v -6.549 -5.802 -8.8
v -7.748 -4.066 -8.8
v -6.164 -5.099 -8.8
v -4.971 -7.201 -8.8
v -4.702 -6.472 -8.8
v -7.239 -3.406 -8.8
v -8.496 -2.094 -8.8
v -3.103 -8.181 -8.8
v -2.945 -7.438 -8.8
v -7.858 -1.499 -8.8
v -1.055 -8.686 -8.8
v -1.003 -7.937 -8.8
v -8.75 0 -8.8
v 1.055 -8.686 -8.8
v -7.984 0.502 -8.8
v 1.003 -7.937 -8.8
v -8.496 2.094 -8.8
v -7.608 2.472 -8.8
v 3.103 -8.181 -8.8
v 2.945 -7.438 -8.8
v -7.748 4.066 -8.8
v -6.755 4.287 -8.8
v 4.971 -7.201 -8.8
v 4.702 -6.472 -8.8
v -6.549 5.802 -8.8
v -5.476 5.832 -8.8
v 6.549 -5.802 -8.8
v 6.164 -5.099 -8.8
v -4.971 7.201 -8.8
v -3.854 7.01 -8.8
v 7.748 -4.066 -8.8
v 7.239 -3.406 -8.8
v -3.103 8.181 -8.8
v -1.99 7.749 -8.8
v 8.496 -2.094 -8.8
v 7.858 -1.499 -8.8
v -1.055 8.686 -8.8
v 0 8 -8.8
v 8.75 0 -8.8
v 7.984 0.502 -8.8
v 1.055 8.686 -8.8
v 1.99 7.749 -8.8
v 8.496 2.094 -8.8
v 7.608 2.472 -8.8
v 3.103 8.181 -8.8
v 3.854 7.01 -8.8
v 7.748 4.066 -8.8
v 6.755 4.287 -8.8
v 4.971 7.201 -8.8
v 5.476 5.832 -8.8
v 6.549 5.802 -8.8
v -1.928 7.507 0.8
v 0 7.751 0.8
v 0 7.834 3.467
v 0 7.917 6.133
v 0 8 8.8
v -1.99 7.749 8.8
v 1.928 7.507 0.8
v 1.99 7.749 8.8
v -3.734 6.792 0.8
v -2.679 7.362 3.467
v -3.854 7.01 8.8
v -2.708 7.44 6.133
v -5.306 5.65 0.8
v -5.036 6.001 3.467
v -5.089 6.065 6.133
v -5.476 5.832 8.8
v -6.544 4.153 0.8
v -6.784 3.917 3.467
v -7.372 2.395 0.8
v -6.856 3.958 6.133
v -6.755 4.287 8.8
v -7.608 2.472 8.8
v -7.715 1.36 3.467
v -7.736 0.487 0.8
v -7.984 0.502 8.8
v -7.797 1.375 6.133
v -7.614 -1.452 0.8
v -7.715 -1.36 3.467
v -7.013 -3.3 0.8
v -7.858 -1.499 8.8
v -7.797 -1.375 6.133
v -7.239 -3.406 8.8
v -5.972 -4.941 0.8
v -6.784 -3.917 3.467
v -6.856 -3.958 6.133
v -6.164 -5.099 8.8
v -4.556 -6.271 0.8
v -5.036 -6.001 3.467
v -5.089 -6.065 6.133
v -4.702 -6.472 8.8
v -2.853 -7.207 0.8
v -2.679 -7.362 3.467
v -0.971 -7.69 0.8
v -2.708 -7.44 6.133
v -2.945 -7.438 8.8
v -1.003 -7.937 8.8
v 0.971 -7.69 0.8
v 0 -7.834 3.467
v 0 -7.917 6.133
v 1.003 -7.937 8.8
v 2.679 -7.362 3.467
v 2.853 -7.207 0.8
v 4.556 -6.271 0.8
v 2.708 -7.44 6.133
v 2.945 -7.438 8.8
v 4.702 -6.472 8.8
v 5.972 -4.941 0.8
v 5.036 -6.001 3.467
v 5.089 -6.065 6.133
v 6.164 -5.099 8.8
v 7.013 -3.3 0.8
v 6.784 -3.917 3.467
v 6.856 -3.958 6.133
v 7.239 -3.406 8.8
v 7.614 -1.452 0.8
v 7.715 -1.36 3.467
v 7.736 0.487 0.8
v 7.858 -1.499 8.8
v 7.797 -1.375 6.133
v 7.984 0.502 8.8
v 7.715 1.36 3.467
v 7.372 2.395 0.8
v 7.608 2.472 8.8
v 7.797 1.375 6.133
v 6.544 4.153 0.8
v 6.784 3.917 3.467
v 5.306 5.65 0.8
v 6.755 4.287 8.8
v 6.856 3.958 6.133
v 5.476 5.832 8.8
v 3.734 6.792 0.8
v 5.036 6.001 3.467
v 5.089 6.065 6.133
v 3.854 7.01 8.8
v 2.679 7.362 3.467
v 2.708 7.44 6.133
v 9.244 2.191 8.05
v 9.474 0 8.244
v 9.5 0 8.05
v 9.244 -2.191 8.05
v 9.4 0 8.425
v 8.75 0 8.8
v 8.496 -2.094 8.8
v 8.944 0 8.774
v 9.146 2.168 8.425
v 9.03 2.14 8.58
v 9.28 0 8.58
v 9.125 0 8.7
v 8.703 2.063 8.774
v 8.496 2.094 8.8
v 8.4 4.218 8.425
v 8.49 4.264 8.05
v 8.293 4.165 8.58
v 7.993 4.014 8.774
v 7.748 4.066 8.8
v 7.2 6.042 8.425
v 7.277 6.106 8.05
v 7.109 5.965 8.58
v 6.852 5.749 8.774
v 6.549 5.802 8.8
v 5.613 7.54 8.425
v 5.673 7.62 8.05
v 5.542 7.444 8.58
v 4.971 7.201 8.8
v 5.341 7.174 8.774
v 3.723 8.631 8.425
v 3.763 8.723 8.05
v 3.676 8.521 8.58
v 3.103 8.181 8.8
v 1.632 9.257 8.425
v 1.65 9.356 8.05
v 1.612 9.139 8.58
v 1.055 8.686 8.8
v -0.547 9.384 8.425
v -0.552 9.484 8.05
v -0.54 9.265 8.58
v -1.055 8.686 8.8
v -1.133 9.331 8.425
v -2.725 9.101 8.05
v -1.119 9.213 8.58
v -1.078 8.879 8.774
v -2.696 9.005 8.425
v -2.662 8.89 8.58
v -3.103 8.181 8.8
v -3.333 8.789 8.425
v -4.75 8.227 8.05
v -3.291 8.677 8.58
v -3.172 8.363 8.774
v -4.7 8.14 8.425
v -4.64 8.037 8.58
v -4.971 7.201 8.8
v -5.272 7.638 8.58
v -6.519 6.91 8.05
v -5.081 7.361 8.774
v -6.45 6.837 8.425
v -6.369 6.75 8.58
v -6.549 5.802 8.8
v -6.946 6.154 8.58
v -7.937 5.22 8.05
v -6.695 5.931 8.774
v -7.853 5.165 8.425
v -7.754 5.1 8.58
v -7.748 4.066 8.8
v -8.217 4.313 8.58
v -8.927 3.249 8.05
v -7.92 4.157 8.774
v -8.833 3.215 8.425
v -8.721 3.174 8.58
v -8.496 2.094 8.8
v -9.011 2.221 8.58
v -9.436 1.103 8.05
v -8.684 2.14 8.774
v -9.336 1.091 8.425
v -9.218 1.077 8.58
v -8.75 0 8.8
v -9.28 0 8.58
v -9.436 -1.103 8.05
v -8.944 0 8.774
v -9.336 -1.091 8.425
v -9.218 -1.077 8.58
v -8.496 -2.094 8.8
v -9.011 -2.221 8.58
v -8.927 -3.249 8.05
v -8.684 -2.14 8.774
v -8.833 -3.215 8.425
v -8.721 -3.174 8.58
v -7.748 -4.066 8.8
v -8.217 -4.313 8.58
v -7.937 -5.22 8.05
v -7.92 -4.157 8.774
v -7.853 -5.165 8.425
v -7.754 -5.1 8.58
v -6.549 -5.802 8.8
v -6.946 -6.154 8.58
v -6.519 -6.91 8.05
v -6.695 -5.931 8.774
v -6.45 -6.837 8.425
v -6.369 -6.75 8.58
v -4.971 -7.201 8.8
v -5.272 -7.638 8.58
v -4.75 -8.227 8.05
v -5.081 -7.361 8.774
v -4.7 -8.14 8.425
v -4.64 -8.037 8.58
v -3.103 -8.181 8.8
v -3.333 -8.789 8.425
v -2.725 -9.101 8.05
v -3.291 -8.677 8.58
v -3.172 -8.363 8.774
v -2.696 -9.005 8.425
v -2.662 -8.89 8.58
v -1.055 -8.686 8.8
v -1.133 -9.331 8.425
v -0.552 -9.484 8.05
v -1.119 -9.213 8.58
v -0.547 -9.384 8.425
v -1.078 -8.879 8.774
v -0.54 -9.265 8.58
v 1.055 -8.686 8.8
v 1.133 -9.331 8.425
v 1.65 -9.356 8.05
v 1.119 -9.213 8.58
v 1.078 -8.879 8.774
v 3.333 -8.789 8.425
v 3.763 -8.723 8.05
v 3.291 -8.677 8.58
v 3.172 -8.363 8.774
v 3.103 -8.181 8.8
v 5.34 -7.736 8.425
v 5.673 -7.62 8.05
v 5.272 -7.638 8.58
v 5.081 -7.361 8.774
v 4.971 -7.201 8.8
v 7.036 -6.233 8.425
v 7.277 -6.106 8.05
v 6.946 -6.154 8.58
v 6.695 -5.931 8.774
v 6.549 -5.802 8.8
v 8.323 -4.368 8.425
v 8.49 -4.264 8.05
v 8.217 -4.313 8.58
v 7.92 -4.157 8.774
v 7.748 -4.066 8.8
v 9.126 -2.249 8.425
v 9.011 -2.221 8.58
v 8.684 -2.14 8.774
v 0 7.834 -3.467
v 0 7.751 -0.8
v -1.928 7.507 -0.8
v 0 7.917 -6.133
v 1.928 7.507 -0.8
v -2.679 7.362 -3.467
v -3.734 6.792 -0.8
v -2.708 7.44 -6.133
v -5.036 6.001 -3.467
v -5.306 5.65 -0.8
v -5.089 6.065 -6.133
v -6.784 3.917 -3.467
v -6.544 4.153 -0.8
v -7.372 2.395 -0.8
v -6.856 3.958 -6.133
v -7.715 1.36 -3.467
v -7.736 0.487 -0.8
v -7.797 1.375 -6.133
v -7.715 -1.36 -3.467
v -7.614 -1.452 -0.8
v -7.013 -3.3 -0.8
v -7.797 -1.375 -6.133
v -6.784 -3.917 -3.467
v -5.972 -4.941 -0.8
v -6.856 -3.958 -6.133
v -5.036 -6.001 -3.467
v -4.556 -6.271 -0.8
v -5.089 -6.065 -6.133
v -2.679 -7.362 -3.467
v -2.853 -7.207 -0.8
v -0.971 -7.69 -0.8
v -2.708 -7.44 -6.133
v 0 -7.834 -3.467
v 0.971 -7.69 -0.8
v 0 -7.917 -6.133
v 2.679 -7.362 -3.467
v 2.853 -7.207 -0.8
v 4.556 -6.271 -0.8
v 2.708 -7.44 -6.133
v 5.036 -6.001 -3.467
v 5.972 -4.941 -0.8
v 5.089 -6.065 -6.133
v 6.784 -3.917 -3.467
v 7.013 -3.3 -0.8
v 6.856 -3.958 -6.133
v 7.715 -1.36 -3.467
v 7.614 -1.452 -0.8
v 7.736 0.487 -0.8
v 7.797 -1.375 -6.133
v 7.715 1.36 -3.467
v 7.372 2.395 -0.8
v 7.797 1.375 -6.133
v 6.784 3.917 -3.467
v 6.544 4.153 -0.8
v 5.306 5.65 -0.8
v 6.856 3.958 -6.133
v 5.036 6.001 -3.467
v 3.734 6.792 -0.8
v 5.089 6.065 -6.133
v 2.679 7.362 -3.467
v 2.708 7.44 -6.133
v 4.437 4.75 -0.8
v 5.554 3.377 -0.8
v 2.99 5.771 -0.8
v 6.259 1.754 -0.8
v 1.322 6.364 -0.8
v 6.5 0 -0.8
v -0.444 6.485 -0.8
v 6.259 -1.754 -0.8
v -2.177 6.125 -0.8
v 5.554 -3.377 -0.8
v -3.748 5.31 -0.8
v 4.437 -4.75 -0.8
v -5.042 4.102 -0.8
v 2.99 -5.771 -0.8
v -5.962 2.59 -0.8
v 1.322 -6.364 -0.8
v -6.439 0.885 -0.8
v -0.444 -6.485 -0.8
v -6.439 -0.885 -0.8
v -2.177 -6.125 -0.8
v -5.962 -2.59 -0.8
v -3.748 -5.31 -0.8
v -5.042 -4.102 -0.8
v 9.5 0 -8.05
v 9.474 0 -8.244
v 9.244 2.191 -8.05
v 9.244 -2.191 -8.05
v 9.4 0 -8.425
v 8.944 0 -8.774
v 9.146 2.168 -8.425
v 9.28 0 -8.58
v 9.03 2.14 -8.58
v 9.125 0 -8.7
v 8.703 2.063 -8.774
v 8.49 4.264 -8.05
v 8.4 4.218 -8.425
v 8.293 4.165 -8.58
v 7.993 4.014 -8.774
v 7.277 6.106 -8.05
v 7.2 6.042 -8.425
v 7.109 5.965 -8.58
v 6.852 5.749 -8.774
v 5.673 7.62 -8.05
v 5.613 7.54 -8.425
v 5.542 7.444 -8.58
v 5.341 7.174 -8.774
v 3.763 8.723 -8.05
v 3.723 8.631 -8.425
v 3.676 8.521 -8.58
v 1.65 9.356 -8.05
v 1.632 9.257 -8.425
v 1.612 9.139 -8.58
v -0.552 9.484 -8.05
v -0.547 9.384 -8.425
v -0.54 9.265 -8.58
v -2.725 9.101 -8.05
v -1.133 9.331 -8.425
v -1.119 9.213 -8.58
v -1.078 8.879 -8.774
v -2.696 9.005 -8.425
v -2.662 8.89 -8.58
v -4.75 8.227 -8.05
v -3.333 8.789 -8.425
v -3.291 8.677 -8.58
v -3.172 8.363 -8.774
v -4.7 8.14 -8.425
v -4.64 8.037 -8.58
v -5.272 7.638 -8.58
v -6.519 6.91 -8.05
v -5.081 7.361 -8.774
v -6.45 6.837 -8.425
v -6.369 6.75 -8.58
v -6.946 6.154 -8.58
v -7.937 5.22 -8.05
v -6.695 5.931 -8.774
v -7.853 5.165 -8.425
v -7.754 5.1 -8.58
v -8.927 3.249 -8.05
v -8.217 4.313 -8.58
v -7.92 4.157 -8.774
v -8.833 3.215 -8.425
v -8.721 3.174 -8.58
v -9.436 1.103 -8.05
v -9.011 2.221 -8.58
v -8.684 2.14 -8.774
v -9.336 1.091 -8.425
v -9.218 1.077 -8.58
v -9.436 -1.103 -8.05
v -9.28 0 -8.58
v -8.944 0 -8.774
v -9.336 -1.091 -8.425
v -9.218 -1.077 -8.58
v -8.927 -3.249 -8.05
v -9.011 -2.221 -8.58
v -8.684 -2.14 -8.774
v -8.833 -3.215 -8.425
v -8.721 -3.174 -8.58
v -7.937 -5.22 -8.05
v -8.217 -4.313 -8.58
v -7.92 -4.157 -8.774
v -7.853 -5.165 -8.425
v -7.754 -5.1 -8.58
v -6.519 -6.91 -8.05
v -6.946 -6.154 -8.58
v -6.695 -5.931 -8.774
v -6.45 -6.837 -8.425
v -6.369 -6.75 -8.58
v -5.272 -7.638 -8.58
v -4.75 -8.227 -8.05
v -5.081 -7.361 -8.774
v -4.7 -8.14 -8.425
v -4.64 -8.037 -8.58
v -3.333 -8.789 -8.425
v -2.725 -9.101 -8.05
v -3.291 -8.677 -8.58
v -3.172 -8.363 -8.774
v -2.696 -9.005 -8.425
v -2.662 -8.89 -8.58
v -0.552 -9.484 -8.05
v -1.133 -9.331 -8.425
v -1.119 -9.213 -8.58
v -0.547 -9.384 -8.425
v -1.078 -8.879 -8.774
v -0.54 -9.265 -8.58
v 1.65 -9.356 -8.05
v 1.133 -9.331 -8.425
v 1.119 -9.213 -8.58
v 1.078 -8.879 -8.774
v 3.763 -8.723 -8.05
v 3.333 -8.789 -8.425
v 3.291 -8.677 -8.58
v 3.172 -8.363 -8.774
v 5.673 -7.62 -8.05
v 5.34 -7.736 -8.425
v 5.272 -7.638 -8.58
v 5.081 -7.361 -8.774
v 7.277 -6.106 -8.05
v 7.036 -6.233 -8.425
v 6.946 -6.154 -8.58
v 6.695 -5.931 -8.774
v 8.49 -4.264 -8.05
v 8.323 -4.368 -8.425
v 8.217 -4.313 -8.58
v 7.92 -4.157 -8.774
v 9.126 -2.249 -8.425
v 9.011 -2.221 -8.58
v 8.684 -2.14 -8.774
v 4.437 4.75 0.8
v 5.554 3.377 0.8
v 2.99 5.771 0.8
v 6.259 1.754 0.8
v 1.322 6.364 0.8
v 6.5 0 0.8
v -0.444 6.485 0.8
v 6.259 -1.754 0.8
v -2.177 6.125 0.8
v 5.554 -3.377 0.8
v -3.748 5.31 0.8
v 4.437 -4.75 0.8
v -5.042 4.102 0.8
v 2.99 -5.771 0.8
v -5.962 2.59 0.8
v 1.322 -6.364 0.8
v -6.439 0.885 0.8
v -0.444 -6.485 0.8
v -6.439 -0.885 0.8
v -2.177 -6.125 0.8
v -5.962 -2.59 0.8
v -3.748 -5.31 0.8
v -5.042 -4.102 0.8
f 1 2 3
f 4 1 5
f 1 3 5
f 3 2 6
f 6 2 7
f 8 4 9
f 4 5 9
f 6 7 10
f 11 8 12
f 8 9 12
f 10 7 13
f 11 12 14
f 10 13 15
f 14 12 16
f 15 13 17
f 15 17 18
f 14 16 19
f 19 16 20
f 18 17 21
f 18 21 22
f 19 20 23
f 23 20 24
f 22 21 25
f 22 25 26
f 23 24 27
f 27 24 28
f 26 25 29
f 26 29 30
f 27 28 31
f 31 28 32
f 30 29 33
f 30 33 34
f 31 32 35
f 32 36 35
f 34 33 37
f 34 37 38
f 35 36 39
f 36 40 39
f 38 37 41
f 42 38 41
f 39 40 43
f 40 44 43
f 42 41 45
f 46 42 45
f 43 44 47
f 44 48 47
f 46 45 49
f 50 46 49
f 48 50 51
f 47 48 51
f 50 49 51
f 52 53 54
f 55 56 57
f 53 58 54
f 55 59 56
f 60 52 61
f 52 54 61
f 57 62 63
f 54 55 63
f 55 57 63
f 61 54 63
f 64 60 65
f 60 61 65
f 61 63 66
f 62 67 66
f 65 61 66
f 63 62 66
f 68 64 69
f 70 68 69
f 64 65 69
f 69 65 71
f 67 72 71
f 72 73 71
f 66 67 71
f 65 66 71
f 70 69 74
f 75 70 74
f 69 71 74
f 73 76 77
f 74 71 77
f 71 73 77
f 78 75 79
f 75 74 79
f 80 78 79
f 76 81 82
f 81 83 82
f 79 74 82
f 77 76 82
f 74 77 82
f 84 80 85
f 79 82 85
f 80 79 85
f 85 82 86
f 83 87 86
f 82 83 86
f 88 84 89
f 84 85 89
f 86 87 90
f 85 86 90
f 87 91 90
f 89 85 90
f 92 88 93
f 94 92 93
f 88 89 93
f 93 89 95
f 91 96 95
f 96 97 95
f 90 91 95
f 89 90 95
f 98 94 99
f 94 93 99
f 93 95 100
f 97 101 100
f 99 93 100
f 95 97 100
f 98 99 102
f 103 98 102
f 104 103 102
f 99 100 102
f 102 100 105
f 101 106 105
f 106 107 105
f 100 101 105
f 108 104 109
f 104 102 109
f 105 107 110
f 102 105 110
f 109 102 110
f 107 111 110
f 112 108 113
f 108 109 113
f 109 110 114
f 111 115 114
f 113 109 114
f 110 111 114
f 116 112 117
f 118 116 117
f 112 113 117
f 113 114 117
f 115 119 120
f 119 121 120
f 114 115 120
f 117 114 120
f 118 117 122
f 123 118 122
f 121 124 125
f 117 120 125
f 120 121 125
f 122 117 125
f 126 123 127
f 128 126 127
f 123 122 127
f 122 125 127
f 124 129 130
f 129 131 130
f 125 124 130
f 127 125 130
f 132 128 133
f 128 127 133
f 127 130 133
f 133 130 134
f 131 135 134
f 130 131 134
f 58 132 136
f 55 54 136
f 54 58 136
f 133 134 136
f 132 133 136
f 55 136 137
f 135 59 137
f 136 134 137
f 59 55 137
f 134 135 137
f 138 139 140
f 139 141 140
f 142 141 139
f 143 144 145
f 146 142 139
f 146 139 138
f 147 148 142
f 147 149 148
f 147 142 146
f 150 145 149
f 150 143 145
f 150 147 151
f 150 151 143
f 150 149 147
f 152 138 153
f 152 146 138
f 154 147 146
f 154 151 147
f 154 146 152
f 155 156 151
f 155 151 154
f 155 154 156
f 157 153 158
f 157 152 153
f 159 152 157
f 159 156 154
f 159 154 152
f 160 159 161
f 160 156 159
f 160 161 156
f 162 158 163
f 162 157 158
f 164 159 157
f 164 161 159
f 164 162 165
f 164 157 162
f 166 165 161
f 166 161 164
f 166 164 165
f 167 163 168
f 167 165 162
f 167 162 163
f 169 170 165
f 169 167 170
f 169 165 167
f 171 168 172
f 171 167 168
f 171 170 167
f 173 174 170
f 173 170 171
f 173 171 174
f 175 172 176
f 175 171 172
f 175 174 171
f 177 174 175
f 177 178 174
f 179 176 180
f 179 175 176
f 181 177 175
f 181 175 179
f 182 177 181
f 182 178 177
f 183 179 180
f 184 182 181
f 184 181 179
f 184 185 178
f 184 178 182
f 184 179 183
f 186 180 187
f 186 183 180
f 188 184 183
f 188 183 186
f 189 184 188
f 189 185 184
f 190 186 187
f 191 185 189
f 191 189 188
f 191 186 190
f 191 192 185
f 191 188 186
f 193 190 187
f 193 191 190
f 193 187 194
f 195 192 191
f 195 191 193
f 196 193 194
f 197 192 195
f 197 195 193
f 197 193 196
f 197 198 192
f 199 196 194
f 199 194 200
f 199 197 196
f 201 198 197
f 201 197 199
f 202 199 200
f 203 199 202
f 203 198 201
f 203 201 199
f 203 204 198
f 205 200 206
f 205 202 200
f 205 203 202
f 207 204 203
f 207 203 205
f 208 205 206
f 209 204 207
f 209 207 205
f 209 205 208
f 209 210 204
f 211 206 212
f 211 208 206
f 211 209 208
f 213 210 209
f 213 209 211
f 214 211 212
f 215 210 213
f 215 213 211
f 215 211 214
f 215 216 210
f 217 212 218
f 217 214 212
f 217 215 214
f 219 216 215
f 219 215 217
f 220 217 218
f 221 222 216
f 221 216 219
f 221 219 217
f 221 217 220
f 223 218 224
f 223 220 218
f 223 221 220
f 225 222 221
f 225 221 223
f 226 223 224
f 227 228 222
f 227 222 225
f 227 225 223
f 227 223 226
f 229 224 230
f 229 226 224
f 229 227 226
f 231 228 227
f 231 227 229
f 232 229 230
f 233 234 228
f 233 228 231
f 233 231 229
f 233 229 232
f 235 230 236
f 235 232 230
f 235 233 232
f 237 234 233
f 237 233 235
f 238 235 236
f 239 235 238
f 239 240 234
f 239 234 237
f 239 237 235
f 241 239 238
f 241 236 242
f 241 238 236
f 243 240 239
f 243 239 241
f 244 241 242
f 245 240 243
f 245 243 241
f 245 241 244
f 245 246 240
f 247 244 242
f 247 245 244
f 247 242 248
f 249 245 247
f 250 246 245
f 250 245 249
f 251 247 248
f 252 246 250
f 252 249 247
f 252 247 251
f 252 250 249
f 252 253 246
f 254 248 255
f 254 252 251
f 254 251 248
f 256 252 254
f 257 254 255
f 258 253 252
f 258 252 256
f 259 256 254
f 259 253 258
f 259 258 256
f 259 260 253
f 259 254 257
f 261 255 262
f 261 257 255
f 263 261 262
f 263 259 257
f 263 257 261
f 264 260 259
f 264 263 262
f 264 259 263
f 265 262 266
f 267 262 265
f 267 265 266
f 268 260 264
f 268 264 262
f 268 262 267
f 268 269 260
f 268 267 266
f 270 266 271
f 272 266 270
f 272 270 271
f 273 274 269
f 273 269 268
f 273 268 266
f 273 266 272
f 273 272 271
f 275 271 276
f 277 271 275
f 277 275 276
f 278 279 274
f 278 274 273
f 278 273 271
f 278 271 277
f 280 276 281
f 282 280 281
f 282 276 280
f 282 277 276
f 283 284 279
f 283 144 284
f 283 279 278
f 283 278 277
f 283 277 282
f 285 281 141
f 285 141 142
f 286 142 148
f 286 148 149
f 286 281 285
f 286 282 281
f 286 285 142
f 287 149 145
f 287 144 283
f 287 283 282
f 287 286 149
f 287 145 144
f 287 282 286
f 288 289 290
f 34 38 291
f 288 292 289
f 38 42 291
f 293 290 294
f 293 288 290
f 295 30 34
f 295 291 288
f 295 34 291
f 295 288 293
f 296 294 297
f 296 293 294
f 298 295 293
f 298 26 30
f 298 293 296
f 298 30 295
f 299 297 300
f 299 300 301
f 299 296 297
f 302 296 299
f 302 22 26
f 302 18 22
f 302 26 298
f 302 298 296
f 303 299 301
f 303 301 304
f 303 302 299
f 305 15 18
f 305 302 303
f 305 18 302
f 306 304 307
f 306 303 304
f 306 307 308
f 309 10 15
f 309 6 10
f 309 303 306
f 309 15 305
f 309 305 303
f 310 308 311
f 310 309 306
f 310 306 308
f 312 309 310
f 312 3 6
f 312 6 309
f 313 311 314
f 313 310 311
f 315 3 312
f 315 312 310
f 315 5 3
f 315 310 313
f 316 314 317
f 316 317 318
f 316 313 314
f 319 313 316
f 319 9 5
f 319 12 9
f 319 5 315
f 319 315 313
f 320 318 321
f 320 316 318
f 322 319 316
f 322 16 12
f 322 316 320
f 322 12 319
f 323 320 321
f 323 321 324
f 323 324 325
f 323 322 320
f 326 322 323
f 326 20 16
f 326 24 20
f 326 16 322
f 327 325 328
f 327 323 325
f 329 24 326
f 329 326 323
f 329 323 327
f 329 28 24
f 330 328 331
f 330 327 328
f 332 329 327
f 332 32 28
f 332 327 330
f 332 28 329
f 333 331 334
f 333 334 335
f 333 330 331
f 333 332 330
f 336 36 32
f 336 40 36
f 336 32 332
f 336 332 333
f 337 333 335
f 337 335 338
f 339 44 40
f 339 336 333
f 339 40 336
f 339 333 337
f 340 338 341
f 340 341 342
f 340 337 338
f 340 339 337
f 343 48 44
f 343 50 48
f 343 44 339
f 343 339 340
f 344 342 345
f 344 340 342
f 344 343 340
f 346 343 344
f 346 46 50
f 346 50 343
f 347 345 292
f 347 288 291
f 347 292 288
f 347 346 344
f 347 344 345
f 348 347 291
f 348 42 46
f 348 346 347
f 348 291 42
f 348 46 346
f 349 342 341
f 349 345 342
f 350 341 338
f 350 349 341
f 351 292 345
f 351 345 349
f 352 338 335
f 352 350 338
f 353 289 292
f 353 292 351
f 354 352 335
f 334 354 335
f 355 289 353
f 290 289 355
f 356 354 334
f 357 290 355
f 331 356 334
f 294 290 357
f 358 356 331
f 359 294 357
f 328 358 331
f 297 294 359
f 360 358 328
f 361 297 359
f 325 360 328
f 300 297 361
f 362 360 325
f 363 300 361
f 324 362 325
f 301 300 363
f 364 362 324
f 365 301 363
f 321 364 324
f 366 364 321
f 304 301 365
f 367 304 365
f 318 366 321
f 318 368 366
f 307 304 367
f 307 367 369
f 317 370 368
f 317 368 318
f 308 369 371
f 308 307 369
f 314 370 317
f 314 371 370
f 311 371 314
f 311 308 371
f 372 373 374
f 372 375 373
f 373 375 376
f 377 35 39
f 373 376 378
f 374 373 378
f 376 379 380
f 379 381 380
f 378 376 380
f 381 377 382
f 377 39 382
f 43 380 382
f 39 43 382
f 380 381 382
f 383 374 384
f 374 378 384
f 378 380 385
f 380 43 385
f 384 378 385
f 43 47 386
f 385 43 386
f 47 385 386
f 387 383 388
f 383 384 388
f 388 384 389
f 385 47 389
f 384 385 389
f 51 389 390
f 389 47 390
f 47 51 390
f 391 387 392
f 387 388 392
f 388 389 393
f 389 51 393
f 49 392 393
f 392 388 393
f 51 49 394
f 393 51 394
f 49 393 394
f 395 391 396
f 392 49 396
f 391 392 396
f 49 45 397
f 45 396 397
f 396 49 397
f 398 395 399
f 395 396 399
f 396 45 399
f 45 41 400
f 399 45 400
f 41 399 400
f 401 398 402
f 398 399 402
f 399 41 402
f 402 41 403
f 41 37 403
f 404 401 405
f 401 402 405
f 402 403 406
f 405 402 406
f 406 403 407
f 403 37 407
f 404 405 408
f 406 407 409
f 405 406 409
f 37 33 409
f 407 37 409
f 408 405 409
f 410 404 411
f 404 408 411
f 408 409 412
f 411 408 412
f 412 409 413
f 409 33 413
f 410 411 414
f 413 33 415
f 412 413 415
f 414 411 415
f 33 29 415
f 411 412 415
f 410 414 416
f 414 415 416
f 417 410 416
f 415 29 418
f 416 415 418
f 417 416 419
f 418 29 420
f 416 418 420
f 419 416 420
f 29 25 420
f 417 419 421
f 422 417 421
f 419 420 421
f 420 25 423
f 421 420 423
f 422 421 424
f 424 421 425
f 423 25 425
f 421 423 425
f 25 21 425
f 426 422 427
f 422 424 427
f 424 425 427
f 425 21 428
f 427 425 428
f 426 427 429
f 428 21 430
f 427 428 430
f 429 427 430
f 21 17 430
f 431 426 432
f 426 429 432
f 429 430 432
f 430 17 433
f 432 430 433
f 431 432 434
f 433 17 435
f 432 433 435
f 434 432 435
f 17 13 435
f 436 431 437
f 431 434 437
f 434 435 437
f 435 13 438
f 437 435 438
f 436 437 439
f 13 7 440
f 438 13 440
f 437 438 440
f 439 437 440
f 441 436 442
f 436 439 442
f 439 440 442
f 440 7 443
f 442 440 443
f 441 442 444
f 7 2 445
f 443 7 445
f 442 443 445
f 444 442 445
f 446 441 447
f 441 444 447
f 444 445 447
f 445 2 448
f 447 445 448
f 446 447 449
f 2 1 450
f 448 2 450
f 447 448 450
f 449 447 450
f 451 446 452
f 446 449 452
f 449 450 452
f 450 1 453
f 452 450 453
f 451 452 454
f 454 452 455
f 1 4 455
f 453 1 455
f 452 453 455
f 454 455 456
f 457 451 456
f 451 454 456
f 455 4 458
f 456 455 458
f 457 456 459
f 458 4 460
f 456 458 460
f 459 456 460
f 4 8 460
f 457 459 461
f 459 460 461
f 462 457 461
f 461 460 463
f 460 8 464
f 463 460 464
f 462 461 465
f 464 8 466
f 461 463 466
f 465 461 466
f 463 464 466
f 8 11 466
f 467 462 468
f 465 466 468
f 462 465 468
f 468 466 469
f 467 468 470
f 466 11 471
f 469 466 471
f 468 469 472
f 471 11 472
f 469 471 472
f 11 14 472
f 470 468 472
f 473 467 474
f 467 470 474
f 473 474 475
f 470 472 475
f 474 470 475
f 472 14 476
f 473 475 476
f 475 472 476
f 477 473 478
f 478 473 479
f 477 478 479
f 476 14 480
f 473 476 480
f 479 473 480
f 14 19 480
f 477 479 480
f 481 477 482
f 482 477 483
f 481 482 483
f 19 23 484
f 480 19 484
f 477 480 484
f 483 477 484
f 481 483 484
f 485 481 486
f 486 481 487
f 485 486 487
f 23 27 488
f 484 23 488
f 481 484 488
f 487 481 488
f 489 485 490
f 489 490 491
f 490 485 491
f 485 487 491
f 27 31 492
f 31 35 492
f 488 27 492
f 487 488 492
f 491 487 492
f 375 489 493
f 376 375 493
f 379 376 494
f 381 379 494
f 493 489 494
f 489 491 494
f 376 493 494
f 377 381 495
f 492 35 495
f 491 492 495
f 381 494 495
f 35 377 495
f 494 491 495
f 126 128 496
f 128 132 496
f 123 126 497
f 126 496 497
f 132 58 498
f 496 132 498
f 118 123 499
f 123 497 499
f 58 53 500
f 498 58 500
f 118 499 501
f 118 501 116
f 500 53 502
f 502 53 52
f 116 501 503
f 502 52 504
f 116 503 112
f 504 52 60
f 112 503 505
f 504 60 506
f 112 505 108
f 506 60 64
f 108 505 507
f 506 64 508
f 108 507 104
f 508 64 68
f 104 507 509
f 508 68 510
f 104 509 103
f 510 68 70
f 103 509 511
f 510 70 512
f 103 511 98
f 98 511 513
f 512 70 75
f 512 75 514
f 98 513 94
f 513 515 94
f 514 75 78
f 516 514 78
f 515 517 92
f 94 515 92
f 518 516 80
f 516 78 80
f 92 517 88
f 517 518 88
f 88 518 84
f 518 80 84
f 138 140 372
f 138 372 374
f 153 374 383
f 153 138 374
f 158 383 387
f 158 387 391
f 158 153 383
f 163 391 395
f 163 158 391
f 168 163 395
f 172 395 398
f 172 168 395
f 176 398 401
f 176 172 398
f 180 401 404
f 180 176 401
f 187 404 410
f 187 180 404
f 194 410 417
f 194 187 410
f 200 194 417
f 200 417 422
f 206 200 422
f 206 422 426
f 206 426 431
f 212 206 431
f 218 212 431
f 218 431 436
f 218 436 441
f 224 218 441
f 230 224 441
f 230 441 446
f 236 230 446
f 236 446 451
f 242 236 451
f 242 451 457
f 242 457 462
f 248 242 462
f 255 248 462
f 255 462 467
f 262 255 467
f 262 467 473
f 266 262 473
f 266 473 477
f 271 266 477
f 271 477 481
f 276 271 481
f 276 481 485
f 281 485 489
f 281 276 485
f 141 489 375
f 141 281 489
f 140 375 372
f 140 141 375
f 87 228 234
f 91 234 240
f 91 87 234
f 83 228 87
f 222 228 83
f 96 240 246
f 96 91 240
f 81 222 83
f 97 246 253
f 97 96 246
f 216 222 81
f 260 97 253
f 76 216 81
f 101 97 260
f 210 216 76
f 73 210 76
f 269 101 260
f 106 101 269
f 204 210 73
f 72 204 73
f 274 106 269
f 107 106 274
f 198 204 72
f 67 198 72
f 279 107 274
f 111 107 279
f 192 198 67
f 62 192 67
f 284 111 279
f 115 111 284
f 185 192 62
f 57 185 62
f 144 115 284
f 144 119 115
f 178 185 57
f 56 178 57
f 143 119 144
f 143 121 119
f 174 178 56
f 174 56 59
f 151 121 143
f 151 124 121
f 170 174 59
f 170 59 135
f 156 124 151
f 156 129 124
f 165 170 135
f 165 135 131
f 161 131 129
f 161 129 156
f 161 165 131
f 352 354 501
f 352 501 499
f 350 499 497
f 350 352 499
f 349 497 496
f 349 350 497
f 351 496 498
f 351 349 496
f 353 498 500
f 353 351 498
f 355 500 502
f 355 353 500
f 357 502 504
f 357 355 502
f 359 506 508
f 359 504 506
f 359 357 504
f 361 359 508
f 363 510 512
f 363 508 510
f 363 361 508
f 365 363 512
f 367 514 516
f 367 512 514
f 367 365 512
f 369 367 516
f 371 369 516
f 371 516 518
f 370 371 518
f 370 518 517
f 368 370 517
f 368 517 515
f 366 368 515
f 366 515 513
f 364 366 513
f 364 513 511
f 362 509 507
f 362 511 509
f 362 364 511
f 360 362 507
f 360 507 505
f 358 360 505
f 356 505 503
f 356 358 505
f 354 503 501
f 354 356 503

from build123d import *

# Parameters (mm, degrees)
BODYSCH_R  = 9.5
BODY_DEPTH = 8.8
FLOWSCH_R  = 6.5
FLOW_DEPTH = 17.6
FILLET1_R  = 0.75


with BuildPart() as part:
    # BodySch → Body (new, symmetric)
    with BuildSketch(Plane.XY):
        Circle(BODYSCH_R)
    extrude(amount=BODY_DEPTH, both=True)

    # FlowSch → Flow (cut)
    with BuildSketch(Plane.XY.offset(-8.8)):
        Circle(FLOWSCH_R)
    extrude(amount=FLOW_DEPTH, mode=Mode.SUBTRACT)

    # ThreadSch → Thread (revolve, cut)
    with BuildSketch(Plane(origin=(0, 0, 0), x_dir=(0, 0, -1), z_dir=(1, 0, 0))):
        Polygon((-0.8, 0), (-0.8, 7.750919254), (-8.8, 8), (-8.8, 0), align=None)
    thread = revolve(axis=Axis((0, 0, 0), (0, 0, 1)), mode=Mode.SUBTRACT)

    # Fillet1
    fillet1_edges = [part.edges().sort_by_distance(p)[0] for p in [
        (-9.5, 0, -8.8),
        (-9.5, 0, 8.8),
    ]]
    fillet(fillet1_edges, radius=FILLET1_R)

    # Mirror1: Thread across plane
    add(thread.mirror(Plane.XY), mode=Mode.SUBTRACT)


solid = part.part
